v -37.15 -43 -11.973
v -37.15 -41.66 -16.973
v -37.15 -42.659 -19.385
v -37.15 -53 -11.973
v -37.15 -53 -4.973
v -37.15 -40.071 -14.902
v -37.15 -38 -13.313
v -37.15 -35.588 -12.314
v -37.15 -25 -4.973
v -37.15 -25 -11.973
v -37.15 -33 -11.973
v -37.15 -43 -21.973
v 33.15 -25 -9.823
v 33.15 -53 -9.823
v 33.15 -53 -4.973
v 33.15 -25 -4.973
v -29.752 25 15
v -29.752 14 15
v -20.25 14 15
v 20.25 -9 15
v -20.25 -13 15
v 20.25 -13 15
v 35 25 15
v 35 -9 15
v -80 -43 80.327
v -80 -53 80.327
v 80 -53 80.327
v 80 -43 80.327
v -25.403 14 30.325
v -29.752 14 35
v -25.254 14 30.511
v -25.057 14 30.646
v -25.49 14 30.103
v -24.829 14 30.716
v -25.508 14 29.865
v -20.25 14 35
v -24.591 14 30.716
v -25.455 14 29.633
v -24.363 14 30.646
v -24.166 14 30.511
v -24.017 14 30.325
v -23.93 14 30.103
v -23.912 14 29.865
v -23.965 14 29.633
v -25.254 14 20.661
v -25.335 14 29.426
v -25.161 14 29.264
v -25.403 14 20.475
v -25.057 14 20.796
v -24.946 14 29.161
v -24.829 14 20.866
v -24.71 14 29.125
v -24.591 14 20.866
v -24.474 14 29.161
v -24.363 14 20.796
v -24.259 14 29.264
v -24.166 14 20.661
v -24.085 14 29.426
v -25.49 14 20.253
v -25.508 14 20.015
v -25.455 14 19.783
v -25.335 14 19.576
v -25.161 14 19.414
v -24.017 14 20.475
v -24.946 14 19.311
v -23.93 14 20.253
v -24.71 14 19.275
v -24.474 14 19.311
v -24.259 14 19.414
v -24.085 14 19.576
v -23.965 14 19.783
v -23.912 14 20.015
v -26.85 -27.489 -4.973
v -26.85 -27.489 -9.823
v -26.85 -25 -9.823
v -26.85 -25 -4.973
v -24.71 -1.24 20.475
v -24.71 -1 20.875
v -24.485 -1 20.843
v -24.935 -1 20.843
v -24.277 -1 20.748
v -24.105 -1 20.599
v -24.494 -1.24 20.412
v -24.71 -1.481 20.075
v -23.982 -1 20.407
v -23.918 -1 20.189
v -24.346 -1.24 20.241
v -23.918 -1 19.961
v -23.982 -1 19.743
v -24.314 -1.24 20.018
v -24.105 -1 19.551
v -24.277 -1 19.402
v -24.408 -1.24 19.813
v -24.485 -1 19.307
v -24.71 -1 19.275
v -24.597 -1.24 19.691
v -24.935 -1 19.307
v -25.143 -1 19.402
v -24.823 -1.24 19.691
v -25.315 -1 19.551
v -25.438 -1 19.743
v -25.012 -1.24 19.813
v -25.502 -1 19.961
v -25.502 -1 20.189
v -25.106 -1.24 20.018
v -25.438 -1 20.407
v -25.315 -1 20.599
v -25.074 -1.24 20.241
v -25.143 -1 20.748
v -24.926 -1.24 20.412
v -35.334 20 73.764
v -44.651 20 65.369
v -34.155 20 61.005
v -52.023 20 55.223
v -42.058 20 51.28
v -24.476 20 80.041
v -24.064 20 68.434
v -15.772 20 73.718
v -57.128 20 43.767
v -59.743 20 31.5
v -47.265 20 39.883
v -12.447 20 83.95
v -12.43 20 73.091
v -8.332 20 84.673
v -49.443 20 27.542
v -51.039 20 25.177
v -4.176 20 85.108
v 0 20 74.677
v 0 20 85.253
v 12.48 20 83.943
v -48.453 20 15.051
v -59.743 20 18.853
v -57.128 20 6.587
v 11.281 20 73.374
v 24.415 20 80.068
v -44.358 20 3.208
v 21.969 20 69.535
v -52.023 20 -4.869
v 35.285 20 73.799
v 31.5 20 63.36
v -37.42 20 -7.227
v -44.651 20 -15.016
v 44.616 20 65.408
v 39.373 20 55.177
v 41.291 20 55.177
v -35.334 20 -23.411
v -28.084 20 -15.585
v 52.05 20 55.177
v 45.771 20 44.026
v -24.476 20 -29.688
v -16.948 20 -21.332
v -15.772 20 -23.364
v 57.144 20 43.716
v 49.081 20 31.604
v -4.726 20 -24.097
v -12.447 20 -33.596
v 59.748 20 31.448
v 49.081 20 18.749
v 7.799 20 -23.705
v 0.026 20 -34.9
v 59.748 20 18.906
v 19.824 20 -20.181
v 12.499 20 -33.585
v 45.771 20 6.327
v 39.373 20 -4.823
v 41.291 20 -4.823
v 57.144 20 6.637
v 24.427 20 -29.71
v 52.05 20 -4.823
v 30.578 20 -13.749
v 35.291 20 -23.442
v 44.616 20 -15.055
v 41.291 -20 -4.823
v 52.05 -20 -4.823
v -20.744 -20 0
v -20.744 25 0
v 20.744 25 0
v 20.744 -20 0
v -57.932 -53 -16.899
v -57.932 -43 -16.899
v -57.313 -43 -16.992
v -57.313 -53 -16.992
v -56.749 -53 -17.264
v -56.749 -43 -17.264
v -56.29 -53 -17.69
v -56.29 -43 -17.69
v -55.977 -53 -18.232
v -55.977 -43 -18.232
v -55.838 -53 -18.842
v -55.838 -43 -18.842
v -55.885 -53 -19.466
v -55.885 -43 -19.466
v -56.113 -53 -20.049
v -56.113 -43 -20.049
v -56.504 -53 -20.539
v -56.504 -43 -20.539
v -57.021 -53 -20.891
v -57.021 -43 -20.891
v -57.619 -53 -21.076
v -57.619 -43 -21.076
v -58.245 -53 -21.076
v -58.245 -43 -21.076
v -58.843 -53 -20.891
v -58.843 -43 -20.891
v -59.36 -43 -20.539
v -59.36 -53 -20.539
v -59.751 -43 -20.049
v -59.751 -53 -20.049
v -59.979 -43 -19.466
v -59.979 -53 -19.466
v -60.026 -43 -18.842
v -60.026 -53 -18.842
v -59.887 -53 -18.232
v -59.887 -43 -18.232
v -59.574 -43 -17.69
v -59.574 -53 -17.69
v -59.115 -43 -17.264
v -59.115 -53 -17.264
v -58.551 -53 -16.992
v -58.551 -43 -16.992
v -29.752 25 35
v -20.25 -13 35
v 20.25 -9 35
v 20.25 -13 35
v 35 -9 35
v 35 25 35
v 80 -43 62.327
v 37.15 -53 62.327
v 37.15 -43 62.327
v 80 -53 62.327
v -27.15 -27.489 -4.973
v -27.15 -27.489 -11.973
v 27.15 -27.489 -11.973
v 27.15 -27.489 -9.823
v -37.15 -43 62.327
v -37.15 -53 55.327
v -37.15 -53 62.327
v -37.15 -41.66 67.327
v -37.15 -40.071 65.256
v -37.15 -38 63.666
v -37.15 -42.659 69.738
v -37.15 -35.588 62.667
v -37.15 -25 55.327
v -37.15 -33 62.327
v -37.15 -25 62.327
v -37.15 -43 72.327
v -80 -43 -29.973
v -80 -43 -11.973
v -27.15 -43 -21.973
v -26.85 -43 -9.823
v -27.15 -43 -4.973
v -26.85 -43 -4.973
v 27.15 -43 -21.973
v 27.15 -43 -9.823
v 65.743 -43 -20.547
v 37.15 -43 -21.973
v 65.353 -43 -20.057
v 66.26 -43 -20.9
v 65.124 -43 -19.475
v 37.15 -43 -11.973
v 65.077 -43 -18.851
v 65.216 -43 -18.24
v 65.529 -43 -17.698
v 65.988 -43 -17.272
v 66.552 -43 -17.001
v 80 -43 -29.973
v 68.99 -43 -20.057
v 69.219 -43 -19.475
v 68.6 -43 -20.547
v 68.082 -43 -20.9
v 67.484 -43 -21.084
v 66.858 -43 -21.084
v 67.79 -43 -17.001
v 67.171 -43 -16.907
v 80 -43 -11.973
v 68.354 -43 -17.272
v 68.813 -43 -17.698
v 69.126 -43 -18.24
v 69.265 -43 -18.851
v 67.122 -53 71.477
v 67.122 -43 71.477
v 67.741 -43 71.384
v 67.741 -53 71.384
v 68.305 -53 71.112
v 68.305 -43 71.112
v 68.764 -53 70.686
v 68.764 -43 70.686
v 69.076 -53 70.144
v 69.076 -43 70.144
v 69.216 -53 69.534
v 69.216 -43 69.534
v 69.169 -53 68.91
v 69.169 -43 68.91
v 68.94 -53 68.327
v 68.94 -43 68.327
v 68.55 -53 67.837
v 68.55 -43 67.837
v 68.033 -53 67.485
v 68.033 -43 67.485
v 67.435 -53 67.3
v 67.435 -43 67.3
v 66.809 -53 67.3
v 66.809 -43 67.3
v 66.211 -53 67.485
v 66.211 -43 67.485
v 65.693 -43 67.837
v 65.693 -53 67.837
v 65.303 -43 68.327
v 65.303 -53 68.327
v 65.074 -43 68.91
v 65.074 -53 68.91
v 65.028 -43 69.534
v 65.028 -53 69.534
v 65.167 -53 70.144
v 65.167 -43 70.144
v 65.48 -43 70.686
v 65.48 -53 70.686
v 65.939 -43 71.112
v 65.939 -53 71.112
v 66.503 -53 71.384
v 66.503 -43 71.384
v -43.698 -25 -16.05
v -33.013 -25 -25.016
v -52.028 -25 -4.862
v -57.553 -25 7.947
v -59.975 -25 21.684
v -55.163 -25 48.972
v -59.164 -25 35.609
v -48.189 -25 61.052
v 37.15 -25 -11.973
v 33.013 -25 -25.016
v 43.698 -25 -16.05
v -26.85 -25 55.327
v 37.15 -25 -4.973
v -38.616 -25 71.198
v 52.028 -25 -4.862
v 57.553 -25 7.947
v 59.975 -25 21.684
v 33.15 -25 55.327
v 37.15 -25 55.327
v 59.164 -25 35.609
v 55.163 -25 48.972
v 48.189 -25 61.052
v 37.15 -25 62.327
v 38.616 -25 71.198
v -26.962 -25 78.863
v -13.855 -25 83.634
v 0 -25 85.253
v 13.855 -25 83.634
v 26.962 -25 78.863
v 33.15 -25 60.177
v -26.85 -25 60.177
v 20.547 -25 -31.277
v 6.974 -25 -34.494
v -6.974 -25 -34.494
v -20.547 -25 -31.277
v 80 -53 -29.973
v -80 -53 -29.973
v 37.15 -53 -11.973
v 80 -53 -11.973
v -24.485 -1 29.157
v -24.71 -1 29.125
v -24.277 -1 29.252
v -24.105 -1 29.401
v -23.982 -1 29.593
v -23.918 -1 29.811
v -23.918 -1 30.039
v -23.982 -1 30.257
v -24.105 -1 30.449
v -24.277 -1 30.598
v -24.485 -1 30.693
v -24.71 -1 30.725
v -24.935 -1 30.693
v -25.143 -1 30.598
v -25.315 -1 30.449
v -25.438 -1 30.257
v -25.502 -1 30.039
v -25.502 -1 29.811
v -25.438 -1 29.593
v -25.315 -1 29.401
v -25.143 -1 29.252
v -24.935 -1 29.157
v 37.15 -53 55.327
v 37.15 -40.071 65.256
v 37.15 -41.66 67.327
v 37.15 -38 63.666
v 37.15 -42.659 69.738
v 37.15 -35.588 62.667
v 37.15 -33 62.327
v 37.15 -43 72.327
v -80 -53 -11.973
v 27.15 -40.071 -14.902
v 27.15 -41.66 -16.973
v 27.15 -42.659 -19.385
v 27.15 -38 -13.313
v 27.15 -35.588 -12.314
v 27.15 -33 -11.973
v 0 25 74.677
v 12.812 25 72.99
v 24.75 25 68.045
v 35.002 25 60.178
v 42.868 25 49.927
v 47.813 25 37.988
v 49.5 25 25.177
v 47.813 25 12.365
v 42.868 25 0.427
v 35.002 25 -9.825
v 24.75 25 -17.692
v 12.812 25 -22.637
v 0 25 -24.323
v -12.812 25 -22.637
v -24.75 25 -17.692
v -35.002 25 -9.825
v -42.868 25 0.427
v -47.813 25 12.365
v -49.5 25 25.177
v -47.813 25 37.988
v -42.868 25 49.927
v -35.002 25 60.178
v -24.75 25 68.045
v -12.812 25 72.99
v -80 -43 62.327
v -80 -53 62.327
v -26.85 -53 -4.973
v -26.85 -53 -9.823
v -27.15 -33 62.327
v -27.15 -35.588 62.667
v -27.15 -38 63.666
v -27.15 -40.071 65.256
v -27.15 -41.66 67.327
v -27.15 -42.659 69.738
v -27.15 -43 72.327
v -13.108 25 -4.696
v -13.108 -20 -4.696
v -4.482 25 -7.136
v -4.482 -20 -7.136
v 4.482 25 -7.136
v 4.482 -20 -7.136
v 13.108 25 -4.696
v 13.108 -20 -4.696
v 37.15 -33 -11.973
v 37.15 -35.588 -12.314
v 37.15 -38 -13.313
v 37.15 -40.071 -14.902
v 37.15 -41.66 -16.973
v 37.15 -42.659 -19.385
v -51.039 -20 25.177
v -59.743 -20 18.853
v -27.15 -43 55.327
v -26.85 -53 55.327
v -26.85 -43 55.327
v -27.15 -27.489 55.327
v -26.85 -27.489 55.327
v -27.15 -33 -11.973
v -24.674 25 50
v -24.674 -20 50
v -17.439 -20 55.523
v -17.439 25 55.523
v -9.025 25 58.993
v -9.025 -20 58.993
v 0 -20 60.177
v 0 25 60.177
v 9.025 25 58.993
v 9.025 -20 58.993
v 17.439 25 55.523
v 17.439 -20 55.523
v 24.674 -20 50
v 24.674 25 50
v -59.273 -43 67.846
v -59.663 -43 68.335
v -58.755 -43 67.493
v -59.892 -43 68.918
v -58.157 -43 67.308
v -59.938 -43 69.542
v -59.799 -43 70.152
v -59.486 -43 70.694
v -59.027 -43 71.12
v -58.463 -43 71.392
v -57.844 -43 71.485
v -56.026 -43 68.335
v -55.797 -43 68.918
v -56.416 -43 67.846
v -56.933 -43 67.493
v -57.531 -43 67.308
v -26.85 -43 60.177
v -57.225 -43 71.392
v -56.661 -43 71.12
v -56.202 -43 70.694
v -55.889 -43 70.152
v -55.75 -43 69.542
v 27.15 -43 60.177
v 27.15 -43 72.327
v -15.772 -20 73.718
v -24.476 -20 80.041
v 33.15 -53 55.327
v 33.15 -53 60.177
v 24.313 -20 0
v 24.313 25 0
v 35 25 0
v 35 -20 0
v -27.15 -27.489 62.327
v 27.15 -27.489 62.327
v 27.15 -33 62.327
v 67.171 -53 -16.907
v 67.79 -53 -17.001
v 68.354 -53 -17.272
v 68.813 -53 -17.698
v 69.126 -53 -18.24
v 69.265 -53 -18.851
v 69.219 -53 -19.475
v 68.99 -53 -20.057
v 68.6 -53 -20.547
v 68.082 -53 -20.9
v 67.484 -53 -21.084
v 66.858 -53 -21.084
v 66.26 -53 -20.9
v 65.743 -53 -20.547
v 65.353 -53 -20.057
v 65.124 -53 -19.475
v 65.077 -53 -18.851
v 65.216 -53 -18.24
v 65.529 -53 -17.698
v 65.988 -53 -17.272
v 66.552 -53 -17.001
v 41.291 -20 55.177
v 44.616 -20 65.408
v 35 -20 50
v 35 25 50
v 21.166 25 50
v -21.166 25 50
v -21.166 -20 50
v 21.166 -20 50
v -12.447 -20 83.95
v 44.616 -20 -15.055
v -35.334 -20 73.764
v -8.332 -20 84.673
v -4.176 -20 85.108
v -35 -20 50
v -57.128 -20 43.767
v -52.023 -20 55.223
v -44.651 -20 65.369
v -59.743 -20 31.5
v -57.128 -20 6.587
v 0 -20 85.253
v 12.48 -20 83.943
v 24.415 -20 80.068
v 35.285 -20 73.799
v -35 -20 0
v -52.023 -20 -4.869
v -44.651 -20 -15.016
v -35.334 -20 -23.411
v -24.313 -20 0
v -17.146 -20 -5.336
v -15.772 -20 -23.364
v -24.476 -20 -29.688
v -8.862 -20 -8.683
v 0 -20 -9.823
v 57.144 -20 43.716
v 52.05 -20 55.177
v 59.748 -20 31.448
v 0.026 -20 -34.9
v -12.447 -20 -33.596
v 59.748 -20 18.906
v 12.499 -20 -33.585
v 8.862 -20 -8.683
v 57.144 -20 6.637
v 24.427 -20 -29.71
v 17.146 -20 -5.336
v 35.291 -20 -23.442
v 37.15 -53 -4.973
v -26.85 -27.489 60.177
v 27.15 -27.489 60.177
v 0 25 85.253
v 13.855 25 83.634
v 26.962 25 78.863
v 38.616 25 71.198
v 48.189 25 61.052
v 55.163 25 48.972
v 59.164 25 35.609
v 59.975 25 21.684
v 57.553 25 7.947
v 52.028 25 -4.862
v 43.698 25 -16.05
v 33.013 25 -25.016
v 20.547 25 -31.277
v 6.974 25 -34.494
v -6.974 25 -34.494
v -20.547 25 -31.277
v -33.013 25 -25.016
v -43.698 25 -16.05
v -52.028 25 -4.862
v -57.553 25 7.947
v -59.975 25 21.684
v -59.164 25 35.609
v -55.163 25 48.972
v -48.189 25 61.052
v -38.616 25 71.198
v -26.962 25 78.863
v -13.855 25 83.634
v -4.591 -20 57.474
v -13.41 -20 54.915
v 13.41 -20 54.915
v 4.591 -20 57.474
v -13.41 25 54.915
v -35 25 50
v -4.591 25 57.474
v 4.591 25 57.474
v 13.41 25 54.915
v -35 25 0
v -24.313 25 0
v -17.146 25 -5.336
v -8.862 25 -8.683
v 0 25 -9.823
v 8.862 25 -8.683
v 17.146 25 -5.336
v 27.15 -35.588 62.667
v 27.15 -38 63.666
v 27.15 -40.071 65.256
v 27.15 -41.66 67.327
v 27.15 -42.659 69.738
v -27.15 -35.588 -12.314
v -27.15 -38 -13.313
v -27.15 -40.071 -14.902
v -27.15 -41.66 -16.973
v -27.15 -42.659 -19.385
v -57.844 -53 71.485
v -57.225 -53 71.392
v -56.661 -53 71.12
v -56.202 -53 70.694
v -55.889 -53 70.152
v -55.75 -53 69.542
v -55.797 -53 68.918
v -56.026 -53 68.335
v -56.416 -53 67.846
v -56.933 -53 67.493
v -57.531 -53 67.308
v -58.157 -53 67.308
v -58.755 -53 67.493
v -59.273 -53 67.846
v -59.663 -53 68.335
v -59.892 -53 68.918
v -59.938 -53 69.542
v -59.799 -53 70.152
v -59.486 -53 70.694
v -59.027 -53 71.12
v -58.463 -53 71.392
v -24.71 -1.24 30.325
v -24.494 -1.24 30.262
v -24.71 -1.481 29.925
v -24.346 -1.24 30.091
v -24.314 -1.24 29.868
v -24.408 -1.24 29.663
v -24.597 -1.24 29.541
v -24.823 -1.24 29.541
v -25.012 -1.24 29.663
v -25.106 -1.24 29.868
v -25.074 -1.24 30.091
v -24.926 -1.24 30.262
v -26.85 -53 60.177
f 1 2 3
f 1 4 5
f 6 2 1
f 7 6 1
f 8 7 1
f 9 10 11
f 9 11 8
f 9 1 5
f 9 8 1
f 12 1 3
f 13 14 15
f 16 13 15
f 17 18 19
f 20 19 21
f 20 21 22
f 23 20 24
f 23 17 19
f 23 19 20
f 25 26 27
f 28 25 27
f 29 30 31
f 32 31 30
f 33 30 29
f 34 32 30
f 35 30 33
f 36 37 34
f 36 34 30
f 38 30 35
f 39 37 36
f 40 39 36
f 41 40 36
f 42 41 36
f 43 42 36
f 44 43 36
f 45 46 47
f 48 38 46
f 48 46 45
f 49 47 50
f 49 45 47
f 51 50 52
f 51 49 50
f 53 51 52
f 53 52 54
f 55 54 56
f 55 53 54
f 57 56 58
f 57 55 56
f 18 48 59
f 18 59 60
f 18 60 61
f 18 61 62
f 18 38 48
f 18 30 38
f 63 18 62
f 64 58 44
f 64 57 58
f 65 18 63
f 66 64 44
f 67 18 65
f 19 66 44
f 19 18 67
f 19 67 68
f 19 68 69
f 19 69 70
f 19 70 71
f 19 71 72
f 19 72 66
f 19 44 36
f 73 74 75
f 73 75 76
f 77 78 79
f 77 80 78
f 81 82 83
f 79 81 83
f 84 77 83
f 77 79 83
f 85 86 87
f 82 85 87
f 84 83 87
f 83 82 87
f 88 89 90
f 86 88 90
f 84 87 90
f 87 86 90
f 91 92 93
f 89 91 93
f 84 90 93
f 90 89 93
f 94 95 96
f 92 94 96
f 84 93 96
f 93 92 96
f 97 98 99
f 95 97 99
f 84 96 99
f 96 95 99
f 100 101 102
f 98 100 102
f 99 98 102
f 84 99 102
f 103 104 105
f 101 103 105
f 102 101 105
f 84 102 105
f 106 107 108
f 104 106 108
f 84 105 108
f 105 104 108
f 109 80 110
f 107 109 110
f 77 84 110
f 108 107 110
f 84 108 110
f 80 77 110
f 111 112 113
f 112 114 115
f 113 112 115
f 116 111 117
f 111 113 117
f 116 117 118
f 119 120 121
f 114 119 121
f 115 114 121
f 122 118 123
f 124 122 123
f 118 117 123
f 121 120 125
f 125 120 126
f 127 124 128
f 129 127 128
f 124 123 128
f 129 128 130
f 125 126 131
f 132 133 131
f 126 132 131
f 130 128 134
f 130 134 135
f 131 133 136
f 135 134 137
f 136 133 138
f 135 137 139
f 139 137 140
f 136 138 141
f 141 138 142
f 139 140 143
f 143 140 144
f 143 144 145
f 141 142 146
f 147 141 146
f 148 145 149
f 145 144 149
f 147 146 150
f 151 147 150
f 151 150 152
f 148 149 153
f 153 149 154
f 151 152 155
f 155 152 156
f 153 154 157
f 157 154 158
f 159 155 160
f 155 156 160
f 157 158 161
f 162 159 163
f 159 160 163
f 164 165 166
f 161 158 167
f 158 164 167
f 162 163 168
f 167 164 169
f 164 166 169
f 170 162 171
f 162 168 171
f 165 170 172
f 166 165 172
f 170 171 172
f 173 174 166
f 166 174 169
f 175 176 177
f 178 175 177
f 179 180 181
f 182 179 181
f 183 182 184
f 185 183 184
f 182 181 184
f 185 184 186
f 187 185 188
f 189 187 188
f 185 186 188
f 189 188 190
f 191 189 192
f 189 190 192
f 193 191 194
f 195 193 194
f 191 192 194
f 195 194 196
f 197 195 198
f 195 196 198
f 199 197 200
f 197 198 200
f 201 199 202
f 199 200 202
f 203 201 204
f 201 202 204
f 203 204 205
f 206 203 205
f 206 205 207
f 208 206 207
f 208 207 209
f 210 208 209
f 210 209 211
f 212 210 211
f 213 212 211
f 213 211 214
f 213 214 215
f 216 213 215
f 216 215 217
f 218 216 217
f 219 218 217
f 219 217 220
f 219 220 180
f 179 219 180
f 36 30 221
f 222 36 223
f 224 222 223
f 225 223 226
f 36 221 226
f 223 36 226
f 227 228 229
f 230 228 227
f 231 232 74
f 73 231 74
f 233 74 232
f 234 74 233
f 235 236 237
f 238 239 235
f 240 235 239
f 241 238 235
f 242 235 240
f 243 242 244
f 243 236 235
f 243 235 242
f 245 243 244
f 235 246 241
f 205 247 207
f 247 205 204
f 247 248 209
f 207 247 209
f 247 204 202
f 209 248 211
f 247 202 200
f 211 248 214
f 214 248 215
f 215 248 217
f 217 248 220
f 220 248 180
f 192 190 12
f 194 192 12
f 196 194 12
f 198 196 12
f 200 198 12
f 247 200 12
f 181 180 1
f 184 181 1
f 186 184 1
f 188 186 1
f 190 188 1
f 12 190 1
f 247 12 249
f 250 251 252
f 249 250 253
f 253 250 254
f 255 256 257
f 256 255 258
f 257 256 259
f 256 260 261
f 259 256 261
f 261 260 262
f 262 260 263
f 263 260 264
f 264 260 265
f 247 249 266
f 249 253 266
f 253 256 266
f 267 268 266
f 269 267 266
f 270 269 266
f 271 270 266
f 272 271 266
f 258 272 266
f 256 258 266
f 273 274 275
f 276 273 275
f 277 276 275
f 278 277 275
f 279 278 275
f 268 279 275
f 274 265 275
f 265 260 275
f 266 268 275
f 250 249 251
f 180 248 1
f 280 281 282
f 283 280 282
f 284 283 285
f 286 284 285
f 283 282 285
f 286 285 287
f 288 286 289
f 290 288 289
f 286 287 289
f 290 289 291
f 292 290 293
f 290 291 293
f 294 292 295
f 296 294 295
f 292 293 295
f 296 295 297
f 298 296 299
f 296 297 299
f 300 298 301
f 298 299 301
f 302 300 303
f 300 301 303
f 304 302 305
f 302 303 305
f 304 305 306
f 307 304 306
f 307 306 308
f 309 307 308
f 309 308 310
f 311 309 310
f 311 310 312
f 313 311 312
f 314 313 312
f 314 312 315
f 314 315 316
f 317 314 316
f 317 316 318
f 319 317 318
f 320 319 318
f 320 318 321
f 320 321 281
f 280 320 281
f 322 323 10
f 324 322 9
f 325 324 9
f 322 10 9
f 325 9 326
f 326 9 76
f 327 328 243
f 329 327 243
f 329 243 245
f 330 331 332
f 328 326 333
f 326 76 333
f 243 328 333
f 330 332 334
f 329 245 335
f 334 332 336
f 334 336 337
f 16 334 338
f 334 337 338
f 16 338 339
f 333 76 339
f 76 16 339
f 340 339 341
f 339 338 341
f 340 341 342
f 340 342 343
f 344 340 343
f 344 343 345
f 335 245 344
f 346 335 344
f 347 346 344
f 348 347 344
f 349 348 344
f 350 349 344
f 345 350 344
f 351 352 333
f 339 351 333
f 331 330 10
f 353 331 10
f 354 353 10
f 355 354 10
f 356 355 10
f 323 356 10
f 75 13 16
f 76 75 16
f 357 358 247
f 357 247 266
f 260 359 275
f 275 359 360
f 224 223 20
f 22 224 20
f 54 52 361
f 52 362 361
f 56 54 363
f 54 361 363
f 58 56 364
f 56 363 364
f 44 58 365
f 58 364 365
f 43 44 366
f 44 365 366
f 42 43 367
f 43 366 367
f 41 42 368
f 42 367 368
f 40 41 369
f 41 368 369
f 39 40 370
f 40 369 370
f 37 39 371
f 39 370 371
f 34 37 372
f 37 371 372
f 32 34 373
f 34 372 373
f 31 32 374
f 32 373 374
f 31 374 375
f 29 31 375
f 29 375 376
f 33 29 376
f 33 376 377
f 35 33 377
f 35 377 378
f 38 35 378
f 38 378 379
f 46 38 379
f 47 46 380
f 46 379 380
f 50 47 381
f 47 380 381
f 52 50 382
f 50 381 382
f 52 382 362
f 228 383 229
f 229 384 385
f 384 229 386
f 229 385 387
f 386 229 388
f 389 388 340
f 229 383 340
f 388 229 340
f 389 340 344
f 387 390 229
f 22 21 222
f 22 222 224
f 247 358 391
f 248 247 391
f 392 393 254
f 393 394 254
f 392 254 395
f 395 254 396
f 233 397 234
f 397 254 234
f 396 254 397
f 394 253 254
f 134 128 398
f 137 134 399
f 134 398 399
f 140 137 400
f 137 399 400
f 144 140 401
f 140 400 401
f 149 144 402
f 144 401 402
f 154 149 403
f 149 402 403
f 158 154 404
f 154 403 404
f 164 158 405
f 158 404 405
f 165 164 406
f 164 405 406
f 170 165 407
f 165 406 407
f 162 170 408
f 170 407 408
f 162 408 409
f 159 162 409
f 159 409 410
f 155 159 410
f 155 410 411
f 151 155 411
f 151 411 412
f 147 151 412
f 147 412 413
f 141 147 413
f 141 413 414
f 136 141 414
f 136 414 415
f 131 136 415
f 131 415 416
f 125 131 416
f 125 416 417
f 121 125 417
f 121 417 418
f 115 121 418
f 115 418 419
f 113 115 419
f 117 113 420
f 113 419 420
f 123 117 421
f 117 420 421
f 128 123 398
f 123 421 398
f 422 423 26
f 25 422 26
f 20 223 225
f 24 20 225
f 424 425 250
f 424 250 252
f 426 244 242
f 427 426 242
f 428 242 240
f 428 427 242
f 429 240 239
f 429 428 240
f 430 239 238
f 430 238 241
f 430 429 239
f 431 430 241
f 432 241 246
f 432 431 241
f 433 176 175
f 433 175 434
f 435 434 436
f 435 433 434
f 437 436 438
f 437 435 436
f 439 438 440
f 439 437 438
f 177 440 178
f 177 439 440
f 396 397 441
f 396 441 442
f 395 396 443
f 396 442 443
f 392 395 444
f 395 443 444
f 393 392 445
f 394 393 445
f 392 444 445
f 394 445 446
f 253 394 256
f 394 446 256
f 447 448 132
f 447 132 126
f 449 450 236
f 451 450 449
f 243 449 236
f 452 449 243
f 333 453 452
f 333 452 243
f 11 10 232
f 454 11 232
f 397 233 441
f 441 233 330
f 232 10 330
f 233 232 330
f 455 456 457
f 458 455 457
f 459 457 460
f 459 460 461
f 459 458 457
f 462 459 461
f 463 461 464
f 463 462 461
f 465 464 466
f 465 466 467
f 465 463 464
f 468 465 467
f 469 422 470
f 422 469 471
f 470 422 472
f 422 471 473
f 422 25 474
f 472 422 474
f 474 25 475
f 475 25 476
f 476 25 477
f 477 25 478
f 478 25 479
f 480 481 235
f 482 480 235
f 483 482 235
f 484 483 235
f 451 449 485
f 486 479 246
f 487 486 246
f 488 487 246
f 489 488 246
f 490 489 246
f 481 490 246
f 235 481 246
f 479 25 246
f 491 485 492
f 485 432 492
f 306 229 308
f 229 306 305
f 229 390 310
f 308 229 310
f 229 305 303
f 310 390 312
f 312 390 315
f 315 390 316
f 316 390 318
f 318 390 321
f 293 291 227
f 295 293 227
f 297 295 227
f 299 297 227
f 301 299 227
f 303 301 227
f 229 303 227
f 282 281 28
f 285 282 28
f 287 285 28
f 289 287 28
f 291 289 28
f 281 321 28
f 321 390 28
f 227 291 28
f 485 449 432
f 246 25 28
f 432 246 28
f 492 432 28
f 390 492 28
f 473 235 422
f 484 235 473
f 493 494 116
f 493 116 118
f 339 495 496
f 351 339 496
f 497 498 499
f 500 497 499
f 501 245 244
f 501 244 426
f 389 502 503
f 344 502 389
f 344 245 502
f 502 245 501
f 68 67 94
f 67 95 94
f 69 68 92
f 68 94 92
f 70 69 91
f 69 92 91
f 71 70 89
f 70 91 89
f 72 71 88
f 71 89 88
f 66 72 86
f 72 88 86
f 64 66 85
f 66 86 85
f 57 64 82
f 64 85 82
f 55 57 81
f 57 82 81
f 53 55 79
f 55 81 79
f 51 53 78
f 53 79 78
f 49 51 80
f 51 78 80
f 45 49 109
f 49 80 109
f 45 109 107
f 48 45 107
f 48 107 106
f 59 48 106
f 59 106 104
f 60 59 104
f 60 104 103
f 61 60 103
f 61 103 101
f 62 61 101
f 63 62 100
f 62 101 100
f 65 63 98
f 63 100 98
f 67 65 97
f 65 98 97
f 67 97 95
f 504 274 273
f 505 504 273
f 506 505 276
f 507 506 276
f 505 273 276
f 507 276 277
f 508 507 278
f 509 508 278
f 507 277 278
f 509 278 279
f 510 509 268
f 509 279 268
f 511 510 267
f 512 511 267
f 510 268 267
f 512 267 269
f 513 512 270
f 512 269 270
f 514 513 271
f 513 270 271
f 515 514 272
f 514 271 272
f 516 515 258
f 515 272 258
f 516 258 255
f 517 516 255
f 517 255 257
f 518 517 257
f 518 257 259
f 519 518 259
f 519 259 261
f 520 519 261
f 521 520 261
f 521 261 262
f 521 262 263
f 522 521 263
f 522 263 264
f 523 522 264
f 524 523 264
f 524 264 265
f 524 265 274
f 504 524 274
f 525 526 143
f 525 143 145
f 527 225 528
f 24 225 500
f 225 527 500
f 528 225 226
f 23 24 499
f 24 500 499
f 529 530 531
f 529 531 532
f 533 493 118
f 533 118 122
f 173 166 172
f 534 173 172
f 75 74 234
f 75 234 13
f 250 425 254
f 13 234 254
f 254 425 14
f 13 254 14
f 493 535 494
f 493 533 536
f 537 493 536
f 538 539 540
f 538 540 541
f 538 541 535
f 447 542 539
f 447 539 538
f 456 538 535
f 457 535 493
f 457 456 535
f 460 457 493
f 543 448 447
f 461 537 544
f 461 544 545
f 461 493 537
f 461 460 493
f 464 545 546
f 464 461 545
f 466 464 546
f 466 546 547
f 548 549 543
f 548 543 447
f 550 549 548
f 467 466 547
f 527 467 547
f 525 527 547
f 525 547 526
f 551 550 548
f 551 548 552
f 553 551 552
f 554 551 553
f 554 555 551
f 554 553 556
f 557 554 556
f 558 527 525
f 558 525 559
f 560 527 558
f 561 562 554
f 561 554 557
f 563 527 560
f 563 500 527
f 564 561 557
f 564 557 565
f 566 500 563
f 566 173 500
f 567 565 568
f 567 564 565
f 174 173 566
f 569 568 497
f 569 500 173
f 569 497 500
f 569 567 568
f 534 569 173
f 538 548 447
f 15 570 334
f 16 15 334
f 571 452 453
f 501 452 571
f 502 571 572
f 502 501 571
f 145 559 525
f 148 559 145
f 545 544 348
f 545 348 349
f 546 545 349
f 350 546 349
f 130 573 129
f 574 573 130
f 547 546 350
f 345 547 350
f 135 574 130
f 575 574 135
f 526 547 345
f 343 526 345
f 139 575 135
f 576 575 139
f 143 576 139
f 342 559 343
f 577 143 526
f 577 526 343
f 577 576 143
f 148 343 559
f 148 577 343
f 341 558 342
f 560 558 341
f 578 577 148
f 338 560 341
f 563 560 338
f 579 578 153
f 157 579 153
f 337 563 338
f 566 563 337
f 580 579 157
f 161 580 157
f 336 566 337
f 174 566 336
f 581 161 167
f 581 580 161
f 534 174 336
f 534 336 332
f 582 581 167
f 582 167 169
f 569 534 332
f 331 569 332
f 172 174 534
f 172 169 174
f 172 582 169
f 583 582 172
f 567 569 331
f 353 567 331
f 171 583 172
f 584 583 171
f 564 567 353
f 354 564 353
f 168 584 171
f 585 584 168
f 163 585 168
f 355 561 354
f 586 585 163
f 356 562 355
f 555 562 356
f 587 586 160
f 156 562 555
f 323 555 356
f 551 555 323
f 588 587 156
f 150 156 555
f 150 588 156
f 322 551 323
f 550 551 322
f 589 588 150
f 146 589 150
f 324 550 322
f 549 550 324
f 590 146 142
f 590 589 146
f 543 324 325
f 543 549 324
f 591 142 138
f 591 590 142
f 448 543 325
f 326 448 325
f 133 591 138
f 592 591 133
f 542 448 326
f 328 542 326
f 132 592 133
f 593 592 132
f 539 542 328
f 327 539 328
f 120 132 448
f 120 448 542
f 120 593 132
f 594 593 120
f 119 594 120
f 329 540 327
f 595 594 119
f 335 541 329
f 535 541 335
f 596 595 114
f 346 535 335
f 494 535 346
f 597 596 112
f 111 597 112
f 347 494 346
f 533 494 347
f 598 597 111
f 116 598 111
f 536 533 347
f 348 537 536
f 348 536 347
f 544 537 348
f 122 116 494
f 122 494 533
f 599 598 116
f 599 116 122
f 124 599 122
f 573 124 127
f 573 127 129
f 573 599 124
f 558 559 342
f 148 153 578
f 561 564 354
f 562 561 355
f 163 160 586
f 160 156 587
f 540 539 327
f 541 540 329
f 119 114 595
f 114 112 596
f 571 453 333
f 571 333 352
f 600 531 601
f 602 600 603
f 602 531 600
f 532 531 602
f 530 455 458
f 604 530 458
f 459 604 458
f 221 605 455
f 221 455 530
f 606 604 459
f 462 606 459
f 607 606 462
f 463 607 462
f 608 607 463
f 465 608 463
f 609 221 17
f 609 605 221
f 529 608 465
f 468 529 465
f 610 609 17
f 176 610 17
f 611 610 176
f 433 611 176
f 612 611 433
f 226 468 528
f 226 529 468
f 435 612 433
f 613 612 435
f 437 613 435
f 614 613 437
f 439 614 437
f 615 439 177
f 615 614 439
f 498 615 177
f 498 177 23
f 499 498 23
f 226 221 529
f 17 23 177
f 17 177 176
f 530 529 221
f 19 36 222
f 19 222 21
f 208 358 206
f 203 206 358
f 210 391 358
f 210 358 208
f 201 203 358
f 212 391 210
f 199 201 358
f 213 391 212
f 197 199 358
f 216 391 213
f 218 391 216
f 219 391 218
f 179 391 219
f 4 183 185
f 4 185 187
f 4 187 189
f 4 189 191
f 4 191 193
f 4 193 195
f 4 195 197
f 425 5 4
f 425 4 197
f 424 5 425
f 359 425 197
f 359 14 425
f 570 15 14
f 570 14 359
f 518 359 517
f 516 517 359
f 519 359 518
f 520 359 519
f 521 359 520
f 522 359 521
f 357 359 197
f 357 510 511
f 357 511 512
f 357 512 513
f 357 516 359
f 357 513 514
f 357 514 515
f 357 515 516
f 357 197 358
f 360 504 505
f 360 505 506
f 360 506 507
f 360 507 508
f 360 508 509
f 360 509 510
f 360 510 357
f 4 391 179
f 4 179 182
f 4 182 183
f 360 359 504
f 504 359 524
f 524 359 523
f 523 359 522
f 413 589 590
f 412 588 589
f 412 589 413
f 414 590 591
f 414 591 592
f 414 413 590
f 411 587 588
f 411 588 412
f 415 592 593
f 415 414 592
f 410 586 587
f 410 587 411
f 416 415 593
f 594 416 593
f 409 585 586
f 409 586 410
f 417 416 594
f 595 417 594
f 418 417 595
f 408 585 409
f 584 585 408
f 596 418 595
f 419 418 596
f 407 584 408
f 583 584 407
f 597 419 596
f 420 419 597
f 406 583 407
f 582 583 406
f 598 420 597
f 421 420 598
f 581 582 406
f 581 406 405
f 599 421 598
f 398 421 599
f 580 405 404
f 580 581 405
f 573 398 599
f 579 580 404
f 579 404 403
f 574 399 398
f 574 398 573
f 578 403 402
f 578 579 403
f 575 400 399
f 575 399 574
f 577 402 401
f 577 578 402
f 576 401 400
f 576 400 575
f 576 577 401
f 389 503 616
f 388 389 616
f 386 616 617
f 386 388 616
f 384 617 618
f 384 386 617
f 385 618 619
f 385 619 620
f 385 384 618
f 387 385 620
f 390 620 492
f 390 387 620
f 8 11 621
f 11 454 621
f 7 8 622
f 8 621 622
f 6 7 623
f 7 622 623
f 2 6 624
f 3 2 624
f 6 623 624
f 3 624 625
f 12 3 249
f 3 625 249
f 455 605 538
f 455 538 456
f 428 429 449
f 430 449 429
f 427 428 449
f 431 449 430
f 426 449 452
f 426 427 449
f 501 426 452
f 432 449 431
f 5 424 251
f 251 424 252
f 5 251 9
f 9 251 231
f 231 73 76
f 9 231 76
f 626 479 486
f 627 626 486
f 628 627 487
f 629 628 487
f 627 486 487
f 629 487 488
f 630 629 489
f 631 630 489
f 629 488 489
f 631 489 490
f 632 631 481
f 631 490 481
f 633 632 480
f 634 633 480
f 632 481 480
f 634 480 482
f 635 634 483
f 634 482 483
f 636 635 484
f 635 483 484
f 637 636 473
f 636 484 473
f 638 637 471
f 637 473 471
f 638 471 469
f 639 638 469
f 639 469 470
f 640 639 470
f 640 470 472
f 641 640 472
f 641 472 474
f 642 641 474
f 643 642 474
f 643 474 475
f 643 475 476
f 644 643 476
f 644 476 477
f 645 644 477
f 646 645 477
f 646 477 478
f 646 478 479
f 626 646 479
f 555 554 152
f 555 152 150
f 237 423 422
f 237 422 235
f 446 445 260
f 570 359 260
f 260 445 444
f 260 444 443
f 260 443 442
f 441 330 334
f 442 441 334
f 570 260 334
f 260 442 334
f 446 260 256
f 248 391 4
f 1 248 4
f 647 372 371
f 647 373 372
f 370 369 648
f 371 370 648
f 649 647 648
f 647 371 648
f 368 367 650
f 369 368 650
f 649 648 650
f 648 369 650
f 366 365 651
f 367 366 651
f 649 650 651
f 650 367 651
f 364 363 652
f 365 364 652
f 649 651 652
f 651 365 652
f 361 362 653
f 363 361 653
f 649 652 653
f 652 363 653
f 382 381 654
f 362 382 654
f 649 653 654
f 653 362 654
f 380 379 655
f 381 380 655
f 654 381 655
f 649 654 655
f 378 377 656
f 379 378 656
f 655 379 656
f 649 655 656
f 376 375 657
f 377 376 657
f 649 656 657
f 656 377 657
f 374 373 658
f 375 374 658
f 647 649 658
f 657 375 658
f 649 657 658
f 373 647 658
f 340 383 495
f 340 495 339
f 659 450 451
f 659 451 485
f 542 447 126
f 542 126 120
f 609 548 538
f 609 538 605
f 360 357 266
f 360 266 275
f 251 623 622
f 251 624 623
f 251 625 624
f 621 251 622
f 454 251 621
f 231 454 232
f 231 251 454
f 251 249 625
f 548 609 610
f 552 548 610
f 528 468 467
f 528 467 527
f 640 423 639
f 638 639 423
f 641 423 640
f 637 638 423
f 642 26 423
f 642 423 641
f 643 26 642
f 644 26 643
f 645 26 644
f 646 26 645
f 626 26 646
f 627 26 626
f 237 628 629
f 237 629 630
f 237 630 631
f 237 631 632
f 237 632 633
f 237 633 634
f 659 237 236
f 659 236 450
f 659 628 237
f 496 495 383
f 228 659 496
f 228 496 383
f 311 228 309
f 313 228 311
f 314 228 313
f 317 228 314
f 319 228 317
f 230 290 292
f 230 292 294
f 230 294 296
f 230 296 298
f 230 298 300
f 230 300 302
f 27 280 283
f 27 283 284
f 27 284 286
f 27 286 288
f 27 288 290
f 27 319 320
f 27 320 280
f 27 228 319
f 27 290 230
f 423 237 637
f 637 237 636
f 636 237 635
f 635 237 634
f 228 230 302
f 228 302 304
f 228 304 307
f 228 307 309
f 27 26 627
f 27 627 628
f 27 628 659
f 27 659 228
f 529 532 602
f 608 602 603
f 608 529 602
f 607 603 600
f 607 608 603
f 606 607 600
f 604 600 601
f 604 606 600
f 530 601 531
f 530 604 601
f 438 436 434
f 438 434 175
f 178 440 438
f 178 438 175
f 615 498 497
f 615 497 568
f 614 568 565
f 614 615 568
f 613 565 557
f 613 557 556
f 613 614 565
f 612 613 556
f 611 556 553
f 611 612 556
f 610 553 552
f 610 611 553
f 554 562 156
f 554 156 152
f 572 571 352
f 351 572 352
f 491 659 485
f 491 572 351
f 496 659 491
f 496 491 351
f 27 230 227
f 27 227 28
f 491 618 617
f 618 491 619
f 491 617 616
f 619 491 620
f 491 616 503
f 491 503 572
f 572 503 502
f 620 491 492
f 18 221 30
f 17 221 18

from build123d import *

# Parameters (mm, degrees)
ESQUISSE1_W                  = 70
ESQUISSE1_H                  = 50
BOSS_EXTRU_1_DEPTH           = 50
ESQUISSE2_W                  = 40.5
ESQUISSE2_H                  = 20
ENL_V_MAT_EXTRU_1_DEPTH      = 38
ESQUISSE3_W                  = 9.502474521
ESQUISSE3_H                  = 20
ENL_V_MAT_EXTRU_2_DEPTH      = 11
ESQUISSE4_R                  = 60.076490873
ESQUISSE4_R_2                = 49.5
BOSS_EXTRU_2_DEPTH           = 50
ESQUISSE5_W                  = 60
ESQUISSE5_H                  = 40
ENL_V_MAT_EXTRU_3_DEPTH      = 24
R_P_TITION_START             = -20
R_P_TITION_CIRCULAIRE1_DEPTH = 40
ESQUISSE12_W                 = 74.3
ESQUISSE12_H                 = 74.3
BOSS_EXTRU_7_DEPTH           = 28
ESQUISSE13_W                 = 160
ESQUISSE13_H                 = 18
BOSS_EXTRU_8_DEPTH           = 10
ESQUISSE15_R                 = 60.076490873
BOSS_EXTRU_9_DEPTH           = 5
ESQUISSE16_W                 = 60
ESQUISSE16_H                 = 70
ENL_V_MAT_EXTRU_4_DEPTH      = 28
ENL_V_MAT_EXTRU_5_REACH      = 156.276
ESQUISSE17_W                 = 60.3
ESQUISSE17_H                 = 28
ENL_V_MAT_EXTRU_6_REACH      = 138.609
ESQUISSE18_W                 = 54.3
ESQUISSE18_H                 = 15.510808694
TROU_TARAUD_M5X0_82_D        = 4.2
TROU_TARAUD_M5X0_82_DEPTH    = 54.927
TROU_TARAUD_M5X0_82_TIP      = 1.2618073
TROU_TARAUD_M5X0_83_D        = 4.2
TROU_TARAUD_M5X0_83_DEPTH    = 54.927
TROU_TARAUD_M5X0_83_TIP      = 1.2618073
CONG_1_R                     = 10
ESQUISSE25_W                 = 16.470730929
ESQUISSE25_H                 = 20
ENL_V_MAT_EXTRU_7_DEPTH      = 34
TROU_TARAUD_M2X0_41_D        = 1.6
TROU_TARAUD_M2X0_41_DEPTH    = 15
TROU_TARAUD_M2X0_41_TIP      = 0.480688495


# Read off the part's stored shape, not the designer's step: Répétition circulaire1
with BuildPart() as part:
    # Esquisse1 → Boss.-Extru.1 (new body)
    with BuildSketch(Plane.XY):
        Rectangle(ESQUISSE1_W, ESQUISSE1_H)
    extrude(amount=BOSS_EXTRU_1_DEPTH)

    # Esquisse2 → Enlèv. mat.-Extru.1 (cut)
    with BuildSketch(Plane(origin=(0, 25, 0), x_dir=(1, 0, 0), z_dir=(0, 1, 0))):
        with Locations((0, -25)):
            Rectangle(ESQUISSE2_W, ESQUISSE2_H)
    extrude(amount=-ENL_V_MAT_EXTRU_1_DEPTH, mode=Mode.SUBTRACT)

    # Esquisse3 → Enlèv. mat.-Extru.2 (cut)
    with BuildSketch(Plane(origin=(0, 25, 0), x_dir=(1, 0, 0), z_dir=(0, 1, 0))):
        with Locations((25.001237261, -25)):
            Rectangle(ESQUISSE3_W, ESQUISSE3_H)
        with Locations((-25.001237261, -25)):
            Rectangle(ESQUISSE3_W, ESQUISSE3_H)
    extrude(amount=-ENL_V_MAT_EXTRU_2_DEPTH, mode=Mode.SUBTRACT)

    # Esquisse4 → Boss.-Extru.2 (add)
    # profile 1 of 7: a face of its own
    with BuildSketch(Plane(origin=(0, 25, 0), x_dir=(1, 0, 0), z_dir=(0, 1, 0))):
        with Locations(Location((0, -25.176679726, 0), (0, 0, 270))):
            Circle(ESQUISSE4_R)
        with Locations(Location((0, -25.176679726, 0), (0, 0, 270))):
            Circle(ESQUISSE4_R_2, mode=Mode.SUBTRACT)
    # profile 2 of 7: a face of its own
    with BuildSketch(Plane(origin=(0, 25, 0), x_dir=(1, 0, 0), z_dir=(0, 1, 0))):
        with BuildLine():
            ThreePointArc((24.673928965, -50), (32.315534297, -38.619381951), (35, -25.176679726))
            ThreePointArc((35, -25.176679726), (32.217729855, -11.501231543), (24.313263828, 0))
            Line((24.313263828, 0), (20.744399349, 0))
            ThreePointArc((20.744399349, 0), (29.503552635, -11.257782921), (32.622006474, -25.176679726))
            ThreePointArc((32.622006474, -25.176679726), (29.619854452, -38.846336948), (21.16596506, -50))
            Line((21.16596506, -50), (24.673928965, -50))
        make_face()
    # profile 3 of 7: a face of its own
    with BuildSketch(Plane(origin=(0, 25, 0), x_dir=(1, 0, 0), z_dir=(0, 1, 0))):
        with BuildLine():
            Line((-20.744399349, 0), (-24.313263828, 0))
            ThreePointArc((-24.313263828, 0), (-34.99908948, -24.924220698), (-24.673928965, -50))
            Line((-24.673928965, -50), (-21.16596506, -50))
            ThreePointArc((-21.16596506, -50), (-32.620847034, -24.901643114), (-20.744399349, 0))
        make_face()
    # profile 4 of 7: a face of its own
    with BuildSketch(Plane(origin=(0, 25, 0), x_dir=(1, 0, 0), z_dir=(0, 1, 0))):
        with BuildLine():
            Line((20.744399349, 0), (24.313263828, 0))
            ThreePointArc((24.313263828, 0), (0, 9.823320274), (-24.313263828, 0))
            Line((-24.313263828, 0), (-20.744399349, 0))
            ThreePointArc((-20.744399349, 0), (0, 7.445326748), (20.744399349, 0))
        make_face()
    # profile 5 of 7: a face of its own
    with BuildSketch(Plane(origin=(0, 25, 0), x_dir=(1, 0, 0), z_dir=(0, 1, 0))):
        with BuildLine():
            ThreePointArc((24.673928965, -50), (32.315534297, -38.619381951), (35, -25.176679726))
            ThreePointArc((35, -25.176679726), (32.217729855, -11.501231543), (24.313263828, 0))
            Line((24.313263828, 0), (20.744399349, 0))
            ThreePointArc((20.744399349, 0), (29.503552635, -11.257782921), (32.622006474, -25.176679726))
            ThreePointArc((32.622006474, -25.176679726), (29.619854452, -38.846336948), (21.16596506, -50))
            Line((21.16596506, -50), (24.673928965, -50))
        make_face()
    # profile 6 of 7: a face of its own
    with BuildSketch(Plane(origin=(0, 25, 0), x_dir=(1, 0, 0), z_dir=(0, 1, 0))):
        with BuildLine():
            Line((-20.744399349, 0), (-24.313263828, 0))
            ThreePointArc((-24.313263828, 0), (-34.99908948, -24.924220698), (-24.673928965, -50))
            Line((-24.673928965, -50), (-21.16596506, -50))
            ThreePointArc((-21.16596506, -50), (-32.620847034, -24.901643114), (-20.744399349, 0))
        make_face()
    # profile 7 of 7: a face of its own
    with BuildSketch(Plane(origin=(0, 25, 0), x_dir=(1, 0, 0), z_dir=(0, 1, 0))):
        with BuildLine():
            ThreePointArc((-24.673928965, -50), (0, -60.176679726), (24.673928965, -50))
            Line((24.673928965, -50), (21.16596506, -50))
            ThreePointArc((21.16596506, -50), (0, -57.798686199), (-21.16596506, -50))
            Line((-21.16596506, -50), (-24.673928965, -50))
        make_face()
    extrude(amount=-BOSS_EXTRU_2_DEPTH)


with BuildPart() as boss_extru_2_piece_1:
    # of the separate pieces the step leaves, piece 1, a body of its own (boss_extru_2_pieces)
    add(part.part.solids().sort_by_distance((0, 25, 85.253170599))[0])

    # Esquisse5 → Enlèv. mat.-Extru.3 (cut)
    with BuildSketch(Plane(origin=(60.076490873, 0, 0), x_dir=(0, 0, -1), z_dir=(1, 0, 0))):
        with Locations((-25.176679726, 0)):
            Rectangle(ESQUISSE5_W, ESQUISSE5_H)
    extrude(amount=-ENL_V_MAT_EXTRU_3_DEPTH, mode=Mode.SUBTRACT)

    # Répétition circulaire1 outline → Répétition circulaire1 (cut)
    with BuildSketch(Plane(origin=(0, 0, 0), x_dir=(1, 0, 0), z_dir=(0, 1, 0)).offset(R_P_TITION_START)):
        with BuildLine():
            Line((39.373214245, 4.823320274), (41.291457614, 4.823320274))
            Line((41.291457614, 4.823320274), (44.615977372, 15.055140003))
            ThreePointArc((44.615977372, 15.055140003), (18.564656642, 31.959458395), (-12.447413605, 33.596159666))
            Line((-12.447413605, 33.596159666), (-15.771933364, 23.364339937))
            Line((-15.771933364, 23.364339937), (-24.475639087, 29.687952296))
            ThreePointArc((-24.475639087, 29.687952296), (-48.602902078, 10.135395619), (-59.742754225, -18.853067366))
            Line((-59.742754225, -18.853067366), (-51.039048501, -25.176679726))
            Line((-51.039048501, -25.176679726), (-59.742754225, -31.500292085))
            ThreePointArc((-59.742754225, -31.500292085), (-48.602902079, -60.488755071), (-24.475639087, -80.041311748))
            Line((-24.475639087, -80.041311748), (-15.771933364, -73.717699388))
            Line((-15.771933364, -73.717699388), (-12.447413605, -83.949519118))
            ThreePointArc((-12.447413605, -83.949519118), (18.564656643, -82.312817847), (44.615977373, -65.408499455))
            Line((44.615977373, -65.408499455), (41.291457614, -55.176679726))
            Line((41.291457614, -55.176679726), (39.373214245, -55.176679726))
            ThreePointArc((39.373214245, -55.176679726), (-49.5, -25.176679726), (39.373214245, 4.823320274))
        make_face()
    extrude(amount=R_P_TITION_CIRCULAIRE1_DEPTH, mode=Mode.SUBTRACT)



with BuildPart() as boss_extru_2_piece_2:
    # of the separate pieces the step leaves, piece 2, a body of its own (boss_extru_2_pieces)
    add(part.part.solids().sort_by_distance((-35, 25, 0))[0])


with BuildPart() as boss_extru_2_piece_1_1:
    add(boss_extru_2_piece_1.part)

    add(boss_extru_2_piece_2.part)  # Boss.-Extru.7 merges Boss.-Extru.2 piece 2
    # Esquisse12 → Boss.-Extru.7 (add)
    with BuildSketch(Plane.XZ.offset(25)):
        with Locations((0, 25.176679726)):
            Rectangle(ESQUISSE12_W, ESQUISSE12_H)
    extrude(amount=BOSS_EXTRU_7_DEPTH)

    # Esquisse13 → Boss.-Extru.8 (add)
    with BuildSketch(Plane.XZ.offset(53)):
        with Locations((0, 71.326679726)):
            Rectangle(ESQUISSE13_W, ESQUISSE13_H)
        with Locations((0, -20.973320274)):
            Rectangle(ESQUISSE13_W, ESQUISSE13_H)
    extrude(amount=-BOSS_EXTRU_8_DEPTH)

    # Esquisse15 → Boss.-Extru.9 (add)
    with BuildSketch(Plane(origin=(0, -20, 0), x_dir=(1, 0, 0), z_dir=(0, 1, 0))):
        with Locations(Location((0, -25.176679726, 0), (0, 0, 270))):
            Circle(ESQUISSE15_R)
    extrude(amount=-BOSS_EXTRU_9_DEPTH)

    # Esquisse16 → Enlèv. mat.-Extru.4 (cut)
    with BuildSketch(Plane.XZ.offset(53)):
        with Locations((3.15, 25.176679726)):
            Rectangle(ESQUISSE16_W, ESQUISSE16_H)
    extrude(amount=-ENL_V_MAT_EXTRU_4_DEPTH, mode=Mode.SUBTRACT)

    # Enlèv. mat.-Extru.5: up to this face of the body (flat: up to its plane)
    enl_v_mat_extru_5_end = Plane(boss_extru_2_piece_1_1.part.faces().sort_by_distance((-37.15, -39, 25.176679726))[0])
    # Esquisse17 → Enlèv. mat.-Extru.5 (cut, up to the picked face)
    with BuildSketch(Plane(origin=(37.15, 0, 0), x_dir=(0, 0, -1), z_dir=(1, 0, 0)), mode=Mode.PRIVATE) as enl_v_mat_extru_5_sk1:
        with Locations((-25.176679726, -39)):
            Rectangle(ESQUISSE17_W, ESQUISSE17_H)
    enl_v_mat_extru_5_tool1 = split(extrude(enl_v_mat_extru_5_sk1.sketch, amount=-ENL_V_MAT_EXTRU_5_REACH, mode=Mode.PRIVATE), bisect_by=enl_v_mat_extru_5_end, keep=Keep.BOTH, mode=Mode.PRIVATE)
    add(enl_v_mat_extru_5_tool1.solids().sort_by(Axis((37.15, -39, 25.17668), (-1, 0, 0)))[0], mode=Mode.SUBTRACT)

    # Enlèv. mat.-Extru.6: up to this face of the body (flat: up to its plane)
    enl_v_mat_extru_6_end = Plane(boss_extru_2_piece_1_1.part.faces().sort_by_distance((0, -34, -11.973320274))[0])
    # Esquisse18 → Enlèv. mat.-Extru.6 (cut, up to the picked face)
    with BuildSketch(Plane.XY.offset(62.326679726), mode=Mode.PRIVATE) as enl_v_mat_extru_6_sk1:
        with Locations((0, -35.244595653)):
            Rectangle(ESQUISSE18_W, ESQUISSE18_H)
    enl_v_mat_extru_6_tool1 = split(extrude(enl_v_mat_extru_6_sk1.sketch, amount=-ENL_V_MAT_EXTRU_6_REACH, mode=Mode.PRIVATE), bisect_by=enl_v_mat_extru_6_end, keep=Keep.BOTH, mode=Mode.PRIVATE)
    add(enl_v_mat_extru_6_tool1.solids().sort_by(Axis((0, -35.244596, 62.32668), (0, 0, -1)))[0], mode=Mode.SUBTRACT)

    # Trou taraudé M5x0.82
    with Locations(Plane(origin=(-57.931903984, -53, -18.999181229), x_dir=(0, 0, -1), z_dir=(0, -1, 0))):
        with Locations((0, 0), (-88.38422, 0.087735642)):
            Hole(TROU_TARAUD_M5X0_82_D / 2, depth=TROU_TARAUD_M5X0_82_DEPTH)
            with Locations((0, 0, -(TROU_TARAUD_M5X0_82_DEPTH + TROU_TARAUD_M5X0_82_TIP / 2))):  # 118° drill point
                Cone(0, TROU_TARAUD_M5X0_82_D / 2, TROU_TARAUD_M5X0_82_TIP, mode=Mode.SUBTRACT)

    # Trou taraudé M5x0.83
    with Locations(Plane(origin=(67.121659864, -53, 69.376817601), x_dir=(0, 0, -1), z_dir=(0, -1, 0))):
        with Locations((0, 0), (88.384296015, 0.049521474)):
            Hole(TROU_TARAUD_M5X0_83_D / 2, depth=TROU_TARAUD_M5X0_83_DEPTH)
            with Locations((0, 0, -(TROU_TARAUD_M5X0_83_DEPTH + TROU_TARAUD_M5X0_83_TIP / 2))):  # 118° drill point
                Cone(0, TROU_TARAUD_M5X0_83_D / 2, TROU_TARAUD_M5X0_83_TIP, mode=Mode.SUBTRACT)

    # Congé1
    cong_1_edges = [boss_extru_2_piece_1_1.edges().sort_by_distance(p)[0] for p in [
        (-32.15, -43, 62.326679726),
        (32.15, -43, -11.973320274),
        (32.15, -43, 62.326679726),
        (-32.15, -43, -11.973320274),
    ]]
    fillet(cong_1_edges, radius=CONG_1_R)

    # Esquisse25 → Enlèv. mat.-Extru.7 (cut)
    with BuildSketch(Plane(origin=(0, 25, 0), x_dir=(1, 0, 0), z_dir=(0, 1, 0))):
        with Locations((26.764634536, -25)):
            Rectangle(ESQUISSE25_W, ESQUISSE25_H)
    extrude(amount=-ENL_V_MAT_EXTRU_7_DEPTH, mode=Mode.SUBTRACT)

    # Trou taraudé M2x0.41
    with Locations(Plane(origin=(-24.71, 14, 20.075), x_dir=(0, 0, 1), z_dir=(0, 1, 0))):
        with Locations((0, 0), (9.85, 0)):
            Hole(TROU_TARAUD_M2X0_41_D / 2, depth=TROU_TARAUD_M2X0_41_DEPTH)
            with Locations((0, 0, -(TROU_TARAUD_M2X0_41_DEPTH + TROU_TARAUD_M2X0_41_TIP / 2))):  # 118° drill point
                Cone(0, TROU_TARAUD_M2X0_41_D / 2, TROU_TARAUD_M2X0_41_TIP, mode=Mode.SUBTRACT)


solid = boss_extru_2_piece_1_1.part
